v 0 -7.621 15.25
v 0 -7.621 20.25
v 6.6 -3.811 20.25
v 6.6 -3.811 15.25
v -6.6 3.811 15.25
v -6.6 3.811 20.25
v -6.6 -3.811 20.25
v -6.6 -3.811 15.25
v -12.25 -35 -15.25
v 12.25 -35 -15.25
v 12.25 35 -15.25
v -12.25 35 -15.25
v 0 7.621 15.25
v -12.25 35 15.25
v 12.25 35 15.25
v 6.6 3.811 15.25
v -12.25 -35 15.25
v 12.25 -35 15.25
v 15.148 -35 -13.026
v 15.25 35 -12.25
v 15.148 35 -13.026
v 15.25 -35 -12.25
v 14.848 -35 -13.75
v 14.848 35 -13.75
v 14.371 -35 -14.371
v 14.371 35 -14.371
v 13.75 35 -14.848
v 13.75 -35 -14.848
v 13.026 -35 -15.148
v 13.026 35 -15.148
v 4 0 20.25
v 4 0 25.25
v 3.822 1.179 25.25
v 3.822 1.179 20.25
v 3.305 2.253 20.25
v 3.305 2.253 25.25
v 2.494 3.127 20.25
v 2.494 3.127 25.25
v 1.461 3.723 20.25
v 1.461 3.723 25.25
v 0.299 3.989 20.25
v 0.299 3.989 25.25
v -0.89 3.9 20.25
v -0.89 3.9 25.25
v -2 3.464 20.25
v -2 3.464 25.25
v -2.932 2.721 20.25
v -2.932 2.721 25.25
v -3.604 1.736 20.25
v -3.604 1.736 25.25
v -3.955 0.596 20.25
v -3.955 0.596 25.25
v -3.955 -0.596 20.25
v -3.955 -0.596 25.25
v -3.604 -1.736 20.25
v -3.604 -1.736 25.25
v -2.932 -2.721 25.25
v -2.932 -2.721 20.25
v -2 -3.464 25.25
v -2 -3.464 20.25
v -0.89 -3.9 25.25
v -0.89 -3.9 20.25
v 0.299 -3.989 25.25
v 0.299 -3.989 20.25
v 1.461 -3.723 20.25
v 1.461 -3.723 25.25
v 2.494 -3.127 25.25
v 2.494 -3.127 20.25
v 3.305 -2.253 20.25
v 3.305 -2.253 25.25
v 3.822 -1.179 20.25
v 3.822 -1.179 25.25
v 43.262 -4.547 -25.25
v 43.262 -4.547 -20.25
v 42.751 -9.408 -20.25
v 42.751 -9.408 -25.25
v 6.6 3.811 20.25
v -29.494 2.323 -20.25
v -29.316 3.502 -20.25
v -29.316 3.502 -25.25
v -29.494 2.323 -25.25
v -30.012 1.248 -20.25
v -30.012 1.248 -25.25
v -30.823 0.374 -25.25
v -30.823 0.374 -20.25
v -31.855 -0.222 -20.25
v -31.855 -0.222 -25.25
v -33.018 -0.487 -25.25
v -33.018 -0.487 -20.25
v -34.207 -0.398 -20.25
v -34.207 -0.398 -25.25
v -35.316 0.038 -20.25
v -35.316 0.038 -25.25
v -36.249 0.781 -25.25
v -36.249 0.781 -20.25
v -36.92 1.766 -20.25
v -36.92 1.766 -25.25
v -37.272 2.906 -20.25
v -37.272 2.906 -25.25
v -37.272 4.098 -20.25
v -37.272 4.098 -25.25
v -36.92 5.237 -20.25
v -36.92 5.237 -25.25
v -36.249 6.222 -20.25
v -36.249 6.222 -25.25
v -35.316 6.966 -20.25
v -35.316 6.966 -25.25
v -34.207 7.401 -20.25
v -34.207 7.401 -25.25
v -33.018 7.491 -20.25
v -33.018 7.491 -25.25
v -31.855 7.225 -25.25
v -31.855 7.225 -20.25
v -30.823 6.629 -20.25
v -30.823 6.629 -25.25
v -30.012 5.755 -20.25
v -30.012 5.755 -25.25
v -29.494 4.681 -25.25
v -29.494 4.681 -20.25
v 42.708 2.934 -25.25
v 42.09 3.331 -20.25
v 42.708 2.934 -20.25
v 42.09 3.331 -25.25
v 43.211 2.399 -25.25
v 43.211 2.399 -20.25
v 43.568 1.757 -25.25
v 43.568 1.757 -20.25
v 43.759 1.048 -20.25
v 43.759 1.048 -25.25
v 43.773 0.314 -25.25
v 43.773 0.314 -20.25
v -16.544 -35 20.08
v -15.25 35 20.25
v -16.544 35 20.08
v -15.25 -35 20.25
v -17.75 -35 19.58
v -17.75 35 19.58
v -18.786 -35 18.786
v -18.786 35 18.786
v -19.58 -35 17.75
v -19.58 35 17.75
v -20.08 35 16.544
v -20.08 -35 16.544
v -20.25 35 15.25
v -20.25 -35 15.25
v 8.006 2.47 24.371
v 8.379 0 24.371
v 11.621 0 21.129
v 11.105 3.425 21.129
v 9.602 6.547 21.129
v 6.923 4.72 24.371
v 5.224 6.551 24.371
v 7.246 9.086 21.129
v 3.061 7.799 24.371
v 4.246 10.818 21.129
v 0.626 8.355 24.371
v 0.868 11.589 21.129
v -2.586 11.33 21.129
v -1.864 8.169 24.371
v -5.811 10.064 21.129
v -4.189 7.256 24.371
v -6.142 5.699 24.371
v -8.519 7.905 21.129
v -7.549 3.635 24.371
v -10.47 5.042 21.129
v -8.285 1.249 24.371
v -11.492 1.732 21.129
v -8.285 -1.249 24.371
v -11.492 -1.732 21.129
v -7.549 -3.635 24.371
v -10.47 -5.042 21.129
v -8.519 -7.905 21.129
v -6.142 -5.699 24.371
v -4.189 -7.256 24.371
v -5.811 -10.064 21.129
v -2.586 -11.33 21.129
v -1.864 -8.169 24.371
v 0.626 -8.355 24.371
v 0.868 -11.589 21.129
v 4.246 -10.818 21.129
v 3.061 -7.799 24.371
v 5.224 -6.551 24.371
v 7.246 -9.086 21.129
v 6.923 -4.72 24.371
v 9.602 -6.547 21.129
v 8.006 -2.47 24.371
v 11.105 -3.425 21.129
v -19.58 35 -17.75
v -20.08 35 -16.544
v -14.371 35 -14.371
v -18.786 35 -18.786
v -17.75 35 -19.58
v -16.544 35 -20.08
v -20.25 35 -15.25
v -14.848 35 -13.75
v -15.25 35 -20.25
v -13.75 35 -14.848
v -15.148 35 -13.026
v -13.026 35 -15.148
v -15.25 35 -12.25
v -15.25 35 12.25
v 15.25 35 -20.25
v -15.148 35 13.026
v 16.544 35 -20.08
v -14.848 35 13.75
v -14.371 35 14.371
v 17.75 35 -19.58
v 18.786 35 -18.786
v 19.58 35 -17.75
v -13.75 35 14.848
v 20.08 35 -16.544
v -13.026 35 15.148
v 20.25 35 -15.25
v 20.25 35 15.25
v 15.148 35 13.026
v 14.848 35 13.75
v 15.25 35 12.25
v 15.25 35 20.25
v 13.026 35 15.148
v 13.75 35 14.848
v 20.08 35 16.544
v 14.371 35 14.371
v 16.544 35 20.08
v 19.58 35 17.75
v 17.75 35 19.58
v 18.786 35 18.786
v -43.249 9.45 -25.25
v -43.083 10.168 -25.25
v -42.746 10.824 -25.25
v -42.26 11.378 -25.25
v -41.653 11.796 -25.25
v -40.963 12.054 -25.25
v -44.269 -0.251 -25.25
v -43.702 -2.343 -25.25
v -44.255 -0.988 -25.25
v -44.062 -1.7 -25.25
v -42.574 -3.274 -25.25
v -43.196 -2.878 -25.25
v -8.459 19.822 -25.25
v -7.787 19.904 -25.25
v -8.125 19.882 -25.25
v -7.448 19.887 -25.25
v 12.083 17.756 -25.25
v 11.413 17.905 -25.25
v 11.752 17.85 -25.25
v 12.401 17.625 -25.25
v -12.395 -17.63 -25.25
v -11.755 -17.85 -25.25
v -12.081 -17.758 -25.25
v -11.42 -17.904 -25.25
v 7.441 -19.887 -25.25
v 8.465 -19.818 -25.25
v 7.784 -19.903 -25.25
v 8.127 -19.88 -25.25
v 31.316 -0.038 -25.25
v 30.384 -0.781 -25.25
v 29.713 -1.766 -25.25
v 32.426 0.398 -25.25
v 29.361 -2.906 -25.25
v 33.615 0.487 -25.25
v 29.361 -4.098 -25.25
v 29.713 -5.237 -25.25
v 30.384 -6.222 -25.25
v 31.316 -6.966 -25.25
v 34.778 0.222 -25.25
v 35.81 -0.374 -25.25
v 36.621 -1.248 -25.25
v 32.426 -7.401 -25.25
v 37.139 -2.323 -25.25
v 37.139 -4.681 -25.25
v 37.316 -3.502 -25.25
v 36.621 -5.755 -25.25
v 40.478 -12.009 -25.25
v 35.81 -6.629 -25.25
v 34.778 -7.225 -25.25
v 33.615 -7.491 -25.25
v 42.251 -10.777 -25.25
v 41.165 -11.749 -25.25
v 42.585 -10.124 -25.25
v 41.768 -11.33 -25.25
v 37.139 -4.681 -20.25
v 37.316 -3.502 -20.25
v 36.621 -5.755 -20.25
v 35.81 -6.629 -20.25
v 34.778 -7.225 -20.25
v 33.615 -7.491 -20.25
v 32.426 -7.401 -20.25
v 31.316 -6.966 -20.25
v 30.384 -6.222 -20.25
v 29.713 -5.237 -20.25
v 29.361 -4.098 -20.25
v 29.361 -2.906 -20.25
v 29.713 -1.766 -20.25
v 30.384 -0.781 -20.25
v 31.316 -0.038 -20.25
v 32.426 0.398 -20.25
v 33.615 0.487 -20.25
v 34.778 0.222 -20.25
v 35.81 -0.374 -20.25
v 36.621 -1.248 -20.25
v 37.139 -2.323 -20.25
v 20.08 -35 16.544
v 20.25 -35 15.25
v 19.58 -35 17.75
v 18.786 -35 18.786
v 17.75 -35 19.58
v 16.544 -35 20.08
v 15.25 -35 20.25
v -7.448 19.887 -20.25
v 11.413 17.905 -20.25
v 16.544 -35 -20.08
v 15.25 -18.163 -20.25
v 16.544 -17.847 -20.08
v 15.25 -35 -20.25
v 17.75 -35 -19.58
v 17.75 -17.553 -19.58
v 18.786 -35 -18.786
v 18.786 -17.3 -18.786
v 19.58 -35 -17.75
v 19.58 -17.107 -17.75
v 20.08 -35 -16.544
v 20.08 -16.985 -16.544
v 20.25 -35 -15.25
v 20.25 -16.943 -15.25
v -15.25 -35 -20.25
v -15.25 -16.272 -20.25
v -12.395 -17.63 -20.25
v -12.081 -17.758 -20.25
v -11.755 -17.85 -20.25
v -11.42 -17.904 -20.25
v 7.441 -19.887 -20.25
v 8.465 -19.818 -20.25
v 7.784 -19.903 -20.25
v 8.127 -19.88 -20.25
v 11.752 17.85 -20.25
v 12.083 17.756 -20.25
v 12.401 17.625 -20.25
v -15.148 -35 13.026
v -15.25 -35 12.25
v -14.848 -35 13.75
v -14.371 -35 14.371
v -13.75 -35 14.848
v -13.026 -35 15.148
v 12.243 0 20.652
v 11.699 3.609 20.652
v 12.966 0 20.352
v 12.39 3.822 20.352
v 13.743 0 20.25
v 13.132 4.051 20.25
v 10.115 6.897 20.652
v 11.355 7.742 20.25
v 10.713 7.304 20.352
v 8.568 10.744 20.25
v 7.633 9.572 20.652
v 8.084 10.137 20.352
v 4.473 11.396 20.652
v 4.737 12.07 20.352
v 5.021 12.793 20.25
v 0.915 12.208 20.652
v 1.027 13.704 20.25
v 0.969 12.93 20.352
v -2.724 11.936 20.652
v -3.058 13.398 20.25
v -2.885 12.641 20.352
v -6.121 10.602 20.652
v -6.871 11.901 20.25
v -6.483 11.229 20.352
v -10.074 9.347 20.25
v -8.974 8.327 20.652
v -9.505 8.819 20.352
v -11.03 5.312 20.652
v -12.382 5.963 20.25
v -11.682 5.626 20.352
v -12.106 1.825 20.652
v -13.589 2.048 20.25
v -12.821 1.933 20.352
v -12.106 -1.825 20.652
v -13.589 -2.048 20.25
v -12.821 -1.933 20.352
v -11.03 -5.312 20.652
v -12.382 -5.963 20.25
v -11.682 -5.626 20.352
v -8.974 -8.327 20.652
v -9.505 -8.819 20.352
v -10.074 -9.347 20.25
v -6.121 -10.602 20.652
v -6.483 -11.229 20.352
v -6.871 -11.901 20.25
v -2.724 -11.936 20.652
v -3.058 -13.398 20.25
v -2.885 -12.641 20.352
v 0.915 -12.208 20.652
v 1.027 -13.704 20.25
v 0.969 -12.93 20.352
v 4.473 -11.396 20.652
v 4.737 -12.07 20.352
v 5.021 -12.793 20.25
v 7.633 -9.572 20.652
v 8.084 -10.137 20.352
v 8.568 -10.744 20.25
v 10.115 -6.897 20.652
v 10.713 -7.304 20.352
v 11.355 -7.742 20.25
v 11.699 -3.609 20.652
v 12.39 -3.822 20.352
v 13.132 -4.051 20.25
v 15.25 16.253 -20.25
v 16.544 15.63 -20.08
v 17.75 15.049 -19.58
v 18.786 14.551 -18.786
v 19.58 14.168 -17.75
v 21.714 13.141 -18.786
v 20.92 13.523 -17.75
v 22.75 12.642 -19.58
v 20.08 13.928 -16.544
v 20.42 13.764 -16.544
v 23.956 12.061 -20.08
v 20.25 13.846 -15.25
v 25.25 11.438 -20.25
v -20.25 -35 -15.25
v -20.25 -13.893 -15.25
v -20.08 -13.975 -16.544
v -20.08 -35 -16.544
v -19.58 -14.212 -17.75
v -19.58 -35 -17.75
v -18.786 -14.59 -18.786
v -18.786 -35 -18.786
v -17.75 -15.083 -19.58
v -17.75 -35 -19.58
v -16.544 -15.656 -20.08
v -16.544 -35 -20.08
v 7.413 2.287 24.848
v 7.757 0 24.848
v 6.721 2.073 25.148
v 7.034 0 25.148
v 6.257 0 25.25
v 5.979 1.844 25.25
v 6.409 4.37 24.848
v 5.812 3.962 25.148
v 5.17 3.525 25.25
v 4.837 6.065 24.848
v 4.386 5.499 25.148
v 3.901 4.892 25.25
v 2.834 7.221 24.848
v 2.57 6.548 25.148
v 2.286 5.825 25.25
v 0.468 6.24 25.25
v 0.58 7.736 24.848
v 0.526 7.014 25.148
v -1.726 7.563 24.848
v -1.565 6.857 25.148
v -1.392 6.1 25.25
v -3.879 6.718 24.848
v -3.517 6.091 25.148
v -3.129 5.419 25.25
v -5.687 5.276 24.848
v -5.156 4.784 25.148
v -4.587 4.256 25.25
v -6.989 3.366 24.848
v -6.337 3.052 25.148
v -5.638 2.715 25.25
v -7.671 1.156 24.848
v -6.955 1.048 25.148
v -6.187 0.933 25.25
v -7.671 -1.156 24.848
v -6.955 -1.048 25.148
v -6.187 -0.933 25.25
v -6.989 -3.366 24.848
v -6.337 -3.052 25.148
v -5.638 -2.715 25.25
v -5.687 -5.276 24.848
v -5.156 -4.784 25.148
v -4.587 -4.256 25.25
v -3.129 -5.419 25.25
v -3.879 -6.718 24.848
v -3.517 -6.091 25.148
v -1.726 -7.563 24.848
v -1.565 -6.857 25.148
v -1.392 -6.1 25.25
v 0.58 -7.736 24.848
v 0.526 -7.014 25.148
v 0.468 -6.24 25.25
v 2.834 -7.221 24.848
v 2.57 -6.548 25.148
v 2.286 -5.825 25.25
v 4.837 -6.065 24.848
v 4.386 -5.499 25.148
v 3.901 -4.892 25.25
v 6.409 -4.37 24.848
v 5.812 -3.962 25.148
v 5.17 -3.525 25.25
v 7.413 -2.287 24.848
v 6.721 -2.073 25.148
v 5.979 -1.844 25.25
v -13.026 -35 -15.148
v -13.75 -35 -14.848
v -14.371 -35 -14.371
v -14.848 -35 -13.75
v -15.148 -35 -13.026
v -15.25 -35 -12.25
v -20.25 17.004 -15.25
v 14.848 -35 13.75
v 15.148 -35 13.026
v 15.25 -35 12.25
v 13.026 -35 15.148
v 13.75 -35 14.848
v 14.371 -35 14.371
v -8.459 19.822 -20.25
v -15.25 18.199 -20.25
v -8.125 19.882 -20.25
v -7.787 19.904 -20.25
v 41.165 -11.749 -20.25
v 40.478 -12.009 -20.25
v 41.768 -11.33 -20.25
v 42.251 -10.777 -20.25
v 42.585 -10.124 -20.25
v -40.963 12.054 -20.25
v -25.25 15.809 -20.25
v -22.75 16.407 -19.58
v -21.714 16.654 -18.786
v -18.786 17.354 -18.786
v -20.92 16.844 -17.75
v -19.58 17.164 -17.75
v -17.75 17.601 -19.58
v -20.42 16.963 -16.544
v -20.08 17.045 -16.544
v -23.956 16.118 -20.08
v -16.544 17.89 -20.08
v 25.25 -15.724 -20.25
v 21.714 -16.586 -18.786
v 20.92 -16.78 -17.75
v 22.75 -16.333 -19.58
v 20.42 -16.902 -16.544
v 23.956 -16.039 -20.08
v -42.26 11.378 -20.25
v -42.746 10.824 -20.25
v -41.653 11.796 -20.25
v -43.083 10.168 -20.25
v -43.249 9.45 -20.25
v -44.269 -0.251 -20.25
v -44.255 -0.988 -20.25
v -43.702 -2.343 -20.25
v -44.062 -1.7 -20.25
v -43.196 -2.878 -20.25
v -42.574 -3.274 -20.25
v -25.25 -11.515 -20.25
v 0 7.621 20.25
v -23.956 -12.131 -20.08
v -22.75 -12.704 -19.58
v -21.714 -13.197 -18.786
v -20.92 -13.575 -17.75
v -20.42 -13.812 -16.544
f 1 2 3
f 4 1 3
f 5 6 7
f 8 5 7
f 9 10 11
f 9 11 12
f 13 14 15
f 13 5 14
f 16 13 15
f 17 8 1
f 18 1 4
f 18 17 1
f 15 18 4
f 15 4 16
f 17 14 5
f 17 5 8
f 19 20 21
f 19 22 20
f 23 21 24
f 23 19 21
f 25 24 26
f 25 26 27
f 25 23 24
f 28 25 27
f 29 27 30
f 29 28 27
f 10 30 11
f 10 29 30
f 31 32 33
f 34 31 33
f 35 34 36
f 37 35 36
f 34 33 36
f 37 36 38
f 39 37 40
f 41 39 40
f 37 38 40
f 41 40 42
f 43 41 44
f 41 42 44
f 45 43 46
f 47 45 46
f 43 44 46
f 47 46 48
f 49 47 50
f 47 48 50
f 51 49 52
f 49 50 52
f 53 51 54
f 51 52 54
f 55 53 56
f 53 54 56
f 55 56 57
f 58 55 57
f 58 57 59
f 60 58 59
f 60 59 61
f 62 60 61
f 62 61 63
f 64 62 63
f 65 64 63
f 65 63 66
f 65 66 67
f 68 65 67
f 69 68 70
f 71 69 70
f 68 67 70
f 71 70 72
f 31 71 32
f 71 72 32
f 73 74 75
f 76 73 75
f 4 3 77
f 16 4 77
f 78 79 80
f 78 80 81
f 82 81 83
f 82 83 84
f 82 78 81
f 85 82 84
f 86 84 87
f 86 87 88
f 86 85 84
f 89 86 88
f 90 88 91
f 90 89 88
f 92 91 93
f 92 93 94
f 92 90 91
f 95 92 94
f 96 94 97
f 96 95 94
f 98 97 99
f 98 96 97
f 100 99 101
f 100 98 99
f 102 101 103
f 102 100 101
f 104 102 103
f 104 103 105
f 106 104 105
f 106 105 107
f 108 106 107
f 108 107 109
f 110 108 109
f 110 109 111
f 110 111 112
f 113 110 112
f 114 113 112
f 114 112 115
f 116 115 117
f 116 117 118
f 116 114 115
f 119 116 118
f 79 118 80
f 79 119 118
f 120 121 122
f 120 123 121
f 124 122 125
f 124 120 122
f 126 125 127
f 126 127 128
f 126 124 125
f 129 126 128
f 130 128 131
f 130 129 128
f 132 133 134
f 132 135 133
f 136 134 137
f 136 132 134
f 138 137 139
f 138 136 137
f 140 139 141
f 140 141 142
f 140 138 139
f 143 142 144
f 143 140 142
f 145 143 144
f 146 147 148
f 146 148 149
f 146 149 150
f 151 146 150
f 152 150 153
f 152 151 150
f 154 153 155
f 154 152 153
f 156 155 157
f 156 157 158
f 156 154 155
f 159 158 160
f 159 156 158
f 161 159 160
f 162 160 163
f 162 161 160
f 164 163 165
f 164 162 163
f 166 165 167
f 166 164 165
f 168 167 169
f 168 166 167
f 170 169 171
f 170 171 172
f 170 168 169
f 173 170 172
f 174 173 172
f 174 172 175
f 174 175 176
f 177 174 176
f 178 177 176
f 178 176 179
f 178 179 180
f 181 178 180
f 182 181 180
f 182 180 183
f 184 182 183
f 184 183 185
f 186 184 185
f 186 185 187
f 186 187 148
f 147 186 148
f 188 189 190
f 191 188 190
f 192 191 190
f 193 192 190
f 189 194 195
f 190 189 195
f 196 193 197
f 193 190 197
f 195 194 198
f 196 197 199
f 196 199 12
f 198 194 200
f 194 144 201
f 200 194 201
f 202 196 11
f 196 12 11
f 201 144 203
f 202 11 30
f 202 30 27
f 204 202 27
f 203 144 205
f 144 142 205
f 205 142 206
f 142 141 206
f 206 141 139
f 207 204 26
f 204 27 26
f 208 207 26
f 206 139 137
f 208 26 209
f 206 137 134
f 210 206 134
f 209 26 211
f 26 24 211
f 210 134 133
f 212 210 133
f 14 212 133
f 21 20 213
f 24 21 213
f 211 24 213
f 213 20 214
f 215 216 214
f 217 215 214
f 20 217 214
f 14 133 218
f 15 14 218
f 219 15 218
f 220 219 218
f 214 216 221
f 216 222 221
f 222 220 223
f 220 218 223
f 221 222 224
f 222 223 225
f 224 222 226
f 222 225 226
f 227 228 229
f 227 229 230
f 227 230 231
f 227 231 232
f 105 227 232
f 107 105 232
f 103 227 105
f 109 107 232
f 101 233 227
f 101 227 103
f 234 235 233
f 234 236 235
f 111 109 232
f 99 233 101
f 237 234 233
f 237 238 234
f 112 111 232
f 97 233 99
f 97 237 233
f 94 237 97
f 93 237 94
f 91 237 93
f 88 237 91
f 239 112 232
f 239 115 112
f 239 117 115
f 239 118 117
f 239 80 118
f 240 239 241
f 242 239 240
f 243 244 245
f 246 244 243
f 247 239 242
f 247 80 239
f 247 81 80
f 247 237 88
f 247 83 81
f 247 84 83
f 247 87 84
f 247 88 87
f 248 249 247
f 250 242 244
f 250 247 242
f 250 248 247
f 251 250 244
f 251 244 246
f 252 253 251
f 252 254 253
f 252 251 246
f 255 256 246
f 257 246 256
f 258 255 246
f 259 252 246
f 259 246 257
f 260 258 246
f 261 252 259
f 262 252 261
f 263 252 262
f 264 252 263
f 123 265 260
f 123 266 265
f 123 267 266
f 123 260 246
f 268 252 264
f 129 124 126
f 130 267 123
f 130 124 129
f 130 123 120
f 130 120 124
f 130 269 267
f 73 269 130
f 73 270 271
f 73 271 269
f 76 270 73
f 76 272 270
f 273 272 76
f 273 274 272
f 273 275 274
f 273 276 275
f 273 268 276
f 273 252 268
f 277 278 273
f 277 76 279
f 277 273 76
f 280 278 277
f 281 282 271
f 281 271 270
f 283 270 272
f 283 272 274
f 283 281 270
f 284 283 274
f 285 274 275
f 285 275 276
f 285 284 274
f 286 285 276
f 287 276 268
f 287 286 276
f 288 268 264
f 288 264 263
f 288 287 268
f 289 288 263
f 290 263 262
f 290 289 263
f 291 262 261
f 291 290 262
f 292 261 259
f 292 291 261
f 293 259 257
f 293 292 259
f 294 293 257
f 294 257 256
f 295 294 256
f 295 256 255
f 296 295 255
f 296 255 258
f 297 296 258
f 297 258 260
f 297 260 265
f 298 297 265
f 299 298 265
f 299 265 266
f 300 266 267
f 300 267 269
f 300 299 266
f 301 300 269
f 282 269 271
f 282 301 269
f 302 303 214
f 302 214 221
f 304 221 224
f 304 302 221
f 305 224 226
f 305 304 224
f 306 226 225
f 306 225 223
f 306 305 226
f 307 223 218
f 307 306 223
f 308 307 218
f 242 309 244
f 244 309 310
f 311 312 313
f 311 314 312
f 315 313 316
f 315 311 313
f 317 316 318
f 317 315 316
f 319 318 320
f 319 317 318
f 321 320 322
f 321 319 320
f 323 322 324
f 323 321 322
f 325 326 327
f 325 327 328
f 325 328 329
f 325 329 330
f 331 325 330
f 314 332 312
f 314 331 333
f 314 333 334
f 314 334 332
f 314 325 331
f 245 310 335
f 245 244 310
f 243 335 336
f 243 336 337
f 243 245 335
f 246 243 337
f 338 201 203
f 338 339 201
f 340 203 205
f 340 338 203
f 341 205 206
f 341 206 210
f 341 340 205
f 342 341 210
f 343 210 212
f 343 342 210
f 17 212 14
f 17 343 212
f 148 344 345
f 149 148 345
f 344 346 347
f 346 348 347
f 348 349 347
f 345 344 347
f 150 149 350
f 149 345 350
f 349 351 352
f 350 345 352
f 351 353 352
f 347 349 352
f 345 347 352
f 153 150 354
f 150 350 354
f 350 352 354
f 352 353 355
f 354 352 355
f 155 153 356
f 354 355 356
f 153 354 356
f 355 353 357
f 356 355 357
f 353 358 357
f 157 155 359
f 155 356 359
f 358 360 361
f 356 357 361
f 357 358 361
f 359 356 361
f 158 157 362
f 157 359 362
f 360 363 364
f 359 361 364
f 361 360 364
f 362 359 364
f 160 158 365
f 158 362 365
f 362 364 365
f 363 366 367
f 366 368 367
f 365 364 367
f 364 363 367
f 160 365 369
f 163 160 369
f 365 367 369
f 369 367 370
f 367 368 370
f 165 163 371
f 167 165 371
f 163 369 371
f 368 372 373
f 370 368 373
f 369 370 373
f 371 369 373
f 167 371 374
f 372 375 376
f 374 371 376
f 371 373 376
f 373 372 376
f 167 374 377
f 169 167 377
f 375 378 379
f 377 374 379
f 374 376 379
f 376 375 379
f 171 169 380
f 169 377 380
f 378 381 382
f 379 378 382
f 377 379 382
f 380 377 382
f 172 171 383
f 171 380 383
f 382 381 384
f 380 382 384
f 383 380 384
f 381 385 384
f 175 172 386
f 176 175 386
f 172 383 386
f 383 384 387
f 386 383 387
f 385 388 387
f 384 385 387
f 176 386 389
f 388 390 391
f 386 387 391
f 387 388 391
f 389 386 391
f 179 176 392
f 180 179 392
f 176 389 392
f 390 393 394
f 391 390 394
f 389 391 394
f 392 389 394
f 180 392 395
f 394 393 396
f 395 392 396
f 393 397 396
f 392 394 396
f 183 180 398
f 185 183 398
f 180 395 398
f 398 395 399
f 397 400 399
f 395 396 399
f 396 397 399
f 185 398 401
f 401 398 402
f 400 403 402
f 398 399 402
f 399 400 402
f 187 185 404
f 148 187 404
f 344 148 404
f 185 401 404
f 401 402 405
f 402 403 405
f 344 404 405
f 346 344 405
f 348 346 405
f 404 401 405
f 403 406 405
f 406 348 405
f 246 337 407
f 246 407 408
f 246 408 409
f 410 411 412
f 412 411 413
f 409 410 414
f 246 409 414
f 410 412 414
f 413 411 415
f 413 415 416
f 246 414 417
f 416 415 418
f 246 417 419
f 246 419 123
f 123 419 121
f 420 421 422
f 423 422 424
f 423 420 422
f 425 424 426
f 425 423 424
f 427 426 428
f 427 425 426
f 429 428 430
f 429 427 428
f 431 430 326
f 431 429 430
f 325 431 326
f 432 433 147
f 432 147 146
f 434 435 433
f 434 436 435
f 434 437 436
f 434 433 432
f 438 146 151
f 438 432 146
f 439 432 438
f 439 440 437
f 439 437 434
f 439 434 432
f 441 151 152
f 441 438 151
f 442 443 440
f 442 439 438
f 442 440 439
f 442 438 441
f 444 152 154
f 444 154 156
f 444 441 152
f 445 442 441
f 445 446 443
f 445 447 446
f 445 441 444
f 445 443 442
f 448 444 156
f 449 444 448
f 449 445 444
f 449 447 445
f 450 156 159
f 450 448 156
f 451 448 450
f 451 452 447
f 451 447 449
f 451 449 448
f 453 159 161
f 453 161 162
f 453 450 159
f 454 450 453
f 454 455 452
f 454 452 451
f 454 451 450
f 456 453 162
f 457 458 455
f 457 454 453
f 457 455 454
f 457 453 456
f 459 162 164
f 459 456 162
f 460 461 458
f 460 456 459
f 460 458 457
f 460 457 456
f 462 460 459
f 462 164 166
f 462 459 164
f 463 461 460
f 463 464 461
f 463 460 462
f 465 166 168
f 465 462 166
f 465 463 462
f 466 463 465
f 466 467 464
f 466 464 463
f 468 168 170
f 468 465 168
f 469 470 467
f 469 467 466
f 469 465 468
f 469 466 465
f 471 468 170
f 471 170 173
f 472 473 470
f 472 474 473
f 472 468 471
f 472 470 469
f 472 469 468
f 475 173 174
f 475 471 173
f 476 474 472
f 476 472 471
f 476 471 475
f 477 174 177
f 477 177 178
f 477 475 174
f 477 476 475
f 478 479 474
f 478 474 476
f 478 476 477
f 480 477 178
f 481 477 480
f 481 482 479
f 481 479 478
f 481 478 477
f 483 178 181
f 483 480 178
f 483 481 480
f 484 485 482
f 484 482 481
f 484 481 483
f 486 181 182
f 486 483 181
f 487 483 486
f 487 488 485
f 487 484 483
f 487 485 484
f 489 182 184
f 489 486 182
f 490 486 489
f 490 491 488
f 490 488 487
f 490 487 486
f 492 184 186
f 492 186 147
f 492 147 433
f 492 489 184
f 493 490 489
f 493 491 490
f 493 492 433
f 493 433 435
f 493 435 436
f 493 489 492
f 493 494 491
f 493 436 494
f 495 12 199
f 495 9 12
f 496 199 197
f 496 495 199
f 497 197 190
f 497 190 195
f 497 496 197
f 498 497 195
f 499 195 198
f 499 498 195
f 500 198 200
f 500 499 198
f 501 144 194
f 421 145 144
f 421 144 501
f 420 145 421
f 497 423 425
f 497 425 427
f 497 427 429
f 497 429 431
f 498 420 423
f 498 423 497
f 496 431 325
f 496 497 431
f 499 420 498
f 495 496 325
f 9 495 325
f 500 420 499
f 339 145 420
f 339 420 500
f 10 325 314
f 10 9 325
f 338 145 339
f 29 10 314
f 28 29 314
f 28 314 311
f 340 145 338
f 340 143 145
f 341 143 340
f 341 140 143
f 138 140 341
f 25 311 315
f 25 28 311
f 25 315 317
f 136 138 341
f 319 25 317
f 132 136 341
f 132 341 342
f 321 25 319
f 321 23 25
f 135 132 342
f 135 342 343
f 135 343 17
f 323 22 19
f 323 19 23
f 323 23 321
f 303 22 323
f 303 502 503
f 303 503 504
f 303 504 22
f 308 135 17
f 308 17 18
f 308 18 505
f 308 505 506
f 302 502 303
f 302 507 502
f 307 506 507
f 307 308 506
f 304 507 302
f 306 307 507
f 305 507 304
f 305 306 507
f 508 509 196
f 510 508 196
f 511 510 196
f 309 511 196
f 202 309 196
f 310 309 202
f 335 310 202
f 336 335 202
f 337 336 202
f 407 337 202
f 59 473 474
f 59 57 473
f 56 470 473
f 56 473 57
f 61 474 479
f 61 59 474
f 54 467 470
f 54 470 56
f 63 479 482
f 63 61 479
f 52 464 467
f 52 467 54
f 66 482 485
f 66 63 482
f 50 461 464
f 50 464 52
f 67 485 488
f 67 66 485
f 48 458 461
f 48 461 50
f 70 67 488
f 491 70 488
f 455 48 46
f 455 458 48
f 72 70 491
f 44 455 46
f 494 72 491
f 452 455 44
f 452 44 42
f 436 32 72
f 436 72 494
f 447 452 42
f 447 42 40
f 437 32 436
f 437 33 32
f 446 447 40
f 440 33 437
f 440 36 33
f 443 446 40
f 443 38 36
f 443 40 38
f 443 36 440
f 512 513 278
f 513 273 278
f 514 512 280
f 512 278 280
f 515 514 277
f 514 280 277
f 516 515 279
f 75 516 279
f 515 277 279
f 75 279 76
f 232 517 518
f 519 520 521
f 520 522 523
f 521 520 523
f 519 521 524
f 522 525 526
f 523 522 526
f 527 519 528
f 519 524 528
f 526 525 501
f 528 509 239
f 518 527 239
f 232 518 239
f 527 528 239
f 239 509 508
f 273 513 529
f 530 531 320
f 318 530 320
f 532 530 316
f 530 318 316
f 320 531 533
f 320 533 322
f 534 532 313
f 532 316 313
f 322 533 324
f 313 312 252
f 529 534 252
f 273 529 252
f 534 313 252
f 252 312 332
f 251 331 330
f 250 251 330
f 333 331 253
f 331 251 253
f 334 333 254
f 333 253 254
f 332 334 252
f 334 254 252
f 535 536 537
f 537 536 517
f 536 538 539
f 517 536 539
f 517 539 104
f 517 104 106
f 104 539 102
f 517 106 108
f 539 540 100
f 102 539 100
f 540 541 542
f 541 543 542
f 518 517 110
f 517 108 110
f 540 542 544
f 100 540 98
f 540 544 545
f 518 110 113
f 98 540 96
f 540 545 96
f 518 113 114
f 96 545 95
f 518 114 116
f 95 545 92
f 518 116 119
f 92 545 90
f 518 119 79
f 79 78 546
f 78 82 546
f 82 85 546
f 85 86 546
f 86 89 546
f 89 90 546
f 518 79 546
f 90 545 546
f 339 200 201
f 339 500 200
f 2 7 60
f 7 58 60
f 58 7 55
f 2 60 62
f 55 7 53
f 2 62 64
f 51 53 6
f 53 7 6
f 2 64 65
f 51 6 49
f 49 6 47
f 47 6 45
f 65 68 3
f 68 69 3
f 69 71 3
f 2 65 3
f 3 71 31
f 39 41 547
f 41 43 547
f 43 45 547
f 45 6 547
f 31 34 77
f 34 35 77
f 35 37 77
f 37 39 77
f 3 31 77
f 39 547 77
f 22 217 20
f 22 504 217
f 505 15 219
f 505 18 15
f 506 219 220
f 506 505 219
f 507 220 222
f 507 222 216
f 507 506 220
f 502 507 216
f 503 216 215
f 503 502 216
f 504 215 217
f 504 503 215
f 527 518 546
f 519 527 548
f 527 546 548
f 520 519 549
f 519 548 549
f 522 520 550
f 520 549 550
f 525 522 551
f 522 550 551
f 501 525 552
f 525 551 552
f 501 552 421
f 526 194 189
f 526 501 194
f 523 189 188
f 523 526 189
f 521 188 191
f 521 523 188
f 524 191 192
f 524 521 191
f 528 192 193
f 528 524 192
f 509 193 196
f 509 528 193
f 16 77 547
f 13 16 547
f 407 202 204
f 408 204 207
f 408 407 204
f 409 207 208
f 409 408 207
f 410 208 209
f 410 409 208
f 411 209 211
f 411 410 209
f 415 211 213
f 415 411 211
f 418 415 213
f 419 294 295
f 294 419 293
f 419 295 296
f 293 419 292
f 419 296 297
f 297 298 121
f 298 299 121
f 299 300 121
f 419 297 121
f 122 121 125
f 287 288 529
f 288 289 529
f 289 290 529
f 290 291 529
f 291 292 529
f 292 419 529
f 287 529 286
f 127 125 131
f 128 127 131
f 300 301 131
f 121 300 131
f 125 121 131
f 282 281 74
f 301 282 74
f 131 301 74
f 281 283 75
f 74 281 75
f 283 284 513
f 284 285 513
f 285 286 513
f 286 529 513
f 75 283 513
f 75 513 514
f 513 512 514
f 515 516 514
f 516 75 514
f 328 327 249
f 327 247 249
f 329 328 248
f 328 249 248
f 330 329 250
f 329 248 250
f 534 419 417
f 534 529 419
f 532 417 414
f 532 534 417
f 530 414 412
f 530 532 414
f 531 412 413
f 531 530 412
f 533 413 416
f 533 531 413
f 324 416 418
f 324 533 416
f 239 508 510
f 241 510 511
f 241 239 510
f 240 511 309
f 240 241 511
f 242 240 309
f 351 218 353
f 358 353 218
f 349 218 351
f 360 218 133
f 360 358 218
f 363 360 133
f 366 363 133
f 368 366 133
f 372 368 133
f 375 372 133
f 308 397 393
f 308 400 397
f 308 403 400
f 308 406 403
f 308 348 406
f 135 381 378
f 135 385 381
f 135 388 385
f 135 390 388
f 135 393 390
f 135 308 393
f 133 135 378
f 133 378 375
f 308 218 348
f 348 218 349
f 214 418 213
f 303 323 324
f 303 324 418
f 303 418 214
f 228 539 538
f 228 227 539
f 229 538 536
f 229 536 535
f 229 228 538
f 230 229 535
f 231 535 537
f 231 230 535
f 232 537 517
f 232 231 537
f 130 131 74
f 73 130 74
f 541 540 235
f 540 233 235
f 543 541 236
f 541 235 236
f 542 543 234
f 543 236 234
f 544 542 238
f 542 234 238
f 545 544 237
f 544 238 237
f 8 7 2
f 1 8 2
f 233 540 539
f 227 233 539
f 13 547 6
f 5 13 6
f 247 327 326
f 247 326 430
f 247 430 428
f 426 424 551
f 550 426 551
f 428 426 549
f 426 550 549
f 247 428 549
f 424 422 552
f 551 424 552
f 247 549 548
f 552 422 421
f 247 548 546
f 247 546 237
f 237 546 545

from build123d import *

# Parameters (mm, degrees)
F1_DEPTH  = 35
F3_DEPTH  = 5
F8_R      = 12.5
F6_R      = 7.5
F10_R     = 3
F11_R     = 4
F12_DEPTH = 5
F13_R     = 4
F14_DEPTH = 5
F15_R     = 3
F16_R     = 5
F17_R     = 5


with BuildPart() as f1:
    # F0 (on Front) → F1 (new body, symmetric)
    with BuildSketch(Plane.XZ):
        with BuildLine():
            Line((-20.25, 15.25), (-20.25, -20.25))
            Line((-20.25, -20.25), (20.25, -20.25))
            Line((20.25, -20.25), (20.25, 15.25))
            ThreePointArc((20.25, 15.25), (18.7855339059, 18.7855339059), (15.25, 20.25))
            Line((15.25, 20.25), (-15.25, 20.25))
            ThreePointArc((-15.25, 20.25), (-18.7855339059, 18.7855339059), (-20.25, 15.25))
        make_face()
        with BuildLine():
            Line((12.25, -15.25), (-12.25, -15.25))
            ThreePointArc((-12.25, -15.25), (-14.3713203436, -14.3713203436), (-15.25, -12.25))
            Line((-15.25, -12.25), (-15.25, 12.25))
            ThreePointArc((-15.25, 12.25), (-14.3713203436, 14.3713203436), (-12.25, 15.25))
            Line((-12.25, 15.25), (12.25, 15.25))
            ThreePointArc((12.25, 15.25), (14.3713203436, 14.3713203436), (15.25, 12.25))
            Line((15.25, 12.25), (15.25, -12.25))
            ThreePointArc((15.25, -12.25), (14.3713203436, -14.3713203436), (12.25, -15.25))
        make_face(mode=Mode.SUBTRACT)
    extrude(amount=F1_DEPTH, both=True)

    # F2 (on face) → F3 (cut, through all)
    with BuildSketch(Plane.XY.offset(20.25)):
        Polygon((6.6, -3.8105117767), (6.6, 3.8105117767), (0, 7.6210235533), (-6.6, 3.8105117767), (-6.6, -3.8105117767), (0, -7.6210235533), align=None)
    extrude(amount=-F3_DEPTH, mode=Mode.SUBTRACT)

    # F8 (on offset) → F9 section 0
    with BuildSketch(Plane.XY.offset(20.25)):
        Circle(F8_R)
    # F6 (on offset) → F9 section 1
    with BuildSketch(Plane.XY.offset(25.25)):
        Circle(F6_R)
    loft()

    # F10
    f10_edges = [f1.edges().sort_by_distance(p)[0] for p in [
        (-12.5, 0, 20.25),
        (-7.5, 0, 25.25),
    ]]
    fillet(f10_edges, radius=F10_R)

    # F11 (on face) → F12 (cut, through all)
    with BuildSketch(Plane.XY.offset(25.25)):
        Circle(F11_R)
    extrude(amount=-F12_DEPTH, mode=Mode.SUBTRACT)

    # F13 (on face) → F14 (join)
    with BuildSketch(Plane(origin=(0, 0, -20.25), x_dir=(1, 0, 0), z_dir=(0, 0, -1))):
        Polygon((-44.4906626391, 2.3624008838), (-43.7589633962, -4.5992523838), (-43.0272641533, -11.5609056514), (-7.9591781516, -19.9412006447), (11.9312597558, -17.8506313793), (43.9934016914, -2.4146651154), (43.2617024485, 4.5469881521), (42.5300032056, 11.5086414197), (7.9591781516, 19.9412006447), (-11.9312597558, 17.8506313793), align=None)
        with Locations((-33.3164834948, -3.5017035195)):
            Circle(F13_R, mode=Mode.SUBTRACT)
        with Locations((33.3164834948, 3.5017035195)):
            Circle(F13_R, mode=Mode.SUBTRACT)
    extrude(amount=F14_DEPTH)

    # F15
    f15_edges = [f1.edges().sort_by_distance(p)[0] for p in [
        (42.530003, -11.508641, -22.75),
        (7.959178, -19.941201, -22.75),
        (-11.93126, -17.850631, -22.75),
        (-44.490663, -2.362401, -22.75),
        (-43.027264, 11.560906, -22.75),
        (-7.959178, 19.941201, -22.75),
        (11.93126, 17.850631, -22.75),
        (43.993402, 2.414665, -22.75),
    ]]
    fillet(f15_edges, radius=F15_R)

    # F16
    f16_edges = [f1.edges().sort_by_distance(p)[0] for p in [
        (-20.25, 1.55528, -20.25),
        (20.25, -1.548771, -20.25),
    ]]
    fillet(f16_edges, radius=F16_R)

    # F17
    f17_edges = [f1.edges().sort_by_distance(p)[0] for p in [
        (-20.25, 26.002018, -20.25),
        (-20.25, -24.446739, -20.25),
        (20.25, 24.422833, -20.25),
        (20.25, -25.971604, -20.25),
    ]]
    fillet(f17_edges, radius=F17_R)


solid = f1.part
